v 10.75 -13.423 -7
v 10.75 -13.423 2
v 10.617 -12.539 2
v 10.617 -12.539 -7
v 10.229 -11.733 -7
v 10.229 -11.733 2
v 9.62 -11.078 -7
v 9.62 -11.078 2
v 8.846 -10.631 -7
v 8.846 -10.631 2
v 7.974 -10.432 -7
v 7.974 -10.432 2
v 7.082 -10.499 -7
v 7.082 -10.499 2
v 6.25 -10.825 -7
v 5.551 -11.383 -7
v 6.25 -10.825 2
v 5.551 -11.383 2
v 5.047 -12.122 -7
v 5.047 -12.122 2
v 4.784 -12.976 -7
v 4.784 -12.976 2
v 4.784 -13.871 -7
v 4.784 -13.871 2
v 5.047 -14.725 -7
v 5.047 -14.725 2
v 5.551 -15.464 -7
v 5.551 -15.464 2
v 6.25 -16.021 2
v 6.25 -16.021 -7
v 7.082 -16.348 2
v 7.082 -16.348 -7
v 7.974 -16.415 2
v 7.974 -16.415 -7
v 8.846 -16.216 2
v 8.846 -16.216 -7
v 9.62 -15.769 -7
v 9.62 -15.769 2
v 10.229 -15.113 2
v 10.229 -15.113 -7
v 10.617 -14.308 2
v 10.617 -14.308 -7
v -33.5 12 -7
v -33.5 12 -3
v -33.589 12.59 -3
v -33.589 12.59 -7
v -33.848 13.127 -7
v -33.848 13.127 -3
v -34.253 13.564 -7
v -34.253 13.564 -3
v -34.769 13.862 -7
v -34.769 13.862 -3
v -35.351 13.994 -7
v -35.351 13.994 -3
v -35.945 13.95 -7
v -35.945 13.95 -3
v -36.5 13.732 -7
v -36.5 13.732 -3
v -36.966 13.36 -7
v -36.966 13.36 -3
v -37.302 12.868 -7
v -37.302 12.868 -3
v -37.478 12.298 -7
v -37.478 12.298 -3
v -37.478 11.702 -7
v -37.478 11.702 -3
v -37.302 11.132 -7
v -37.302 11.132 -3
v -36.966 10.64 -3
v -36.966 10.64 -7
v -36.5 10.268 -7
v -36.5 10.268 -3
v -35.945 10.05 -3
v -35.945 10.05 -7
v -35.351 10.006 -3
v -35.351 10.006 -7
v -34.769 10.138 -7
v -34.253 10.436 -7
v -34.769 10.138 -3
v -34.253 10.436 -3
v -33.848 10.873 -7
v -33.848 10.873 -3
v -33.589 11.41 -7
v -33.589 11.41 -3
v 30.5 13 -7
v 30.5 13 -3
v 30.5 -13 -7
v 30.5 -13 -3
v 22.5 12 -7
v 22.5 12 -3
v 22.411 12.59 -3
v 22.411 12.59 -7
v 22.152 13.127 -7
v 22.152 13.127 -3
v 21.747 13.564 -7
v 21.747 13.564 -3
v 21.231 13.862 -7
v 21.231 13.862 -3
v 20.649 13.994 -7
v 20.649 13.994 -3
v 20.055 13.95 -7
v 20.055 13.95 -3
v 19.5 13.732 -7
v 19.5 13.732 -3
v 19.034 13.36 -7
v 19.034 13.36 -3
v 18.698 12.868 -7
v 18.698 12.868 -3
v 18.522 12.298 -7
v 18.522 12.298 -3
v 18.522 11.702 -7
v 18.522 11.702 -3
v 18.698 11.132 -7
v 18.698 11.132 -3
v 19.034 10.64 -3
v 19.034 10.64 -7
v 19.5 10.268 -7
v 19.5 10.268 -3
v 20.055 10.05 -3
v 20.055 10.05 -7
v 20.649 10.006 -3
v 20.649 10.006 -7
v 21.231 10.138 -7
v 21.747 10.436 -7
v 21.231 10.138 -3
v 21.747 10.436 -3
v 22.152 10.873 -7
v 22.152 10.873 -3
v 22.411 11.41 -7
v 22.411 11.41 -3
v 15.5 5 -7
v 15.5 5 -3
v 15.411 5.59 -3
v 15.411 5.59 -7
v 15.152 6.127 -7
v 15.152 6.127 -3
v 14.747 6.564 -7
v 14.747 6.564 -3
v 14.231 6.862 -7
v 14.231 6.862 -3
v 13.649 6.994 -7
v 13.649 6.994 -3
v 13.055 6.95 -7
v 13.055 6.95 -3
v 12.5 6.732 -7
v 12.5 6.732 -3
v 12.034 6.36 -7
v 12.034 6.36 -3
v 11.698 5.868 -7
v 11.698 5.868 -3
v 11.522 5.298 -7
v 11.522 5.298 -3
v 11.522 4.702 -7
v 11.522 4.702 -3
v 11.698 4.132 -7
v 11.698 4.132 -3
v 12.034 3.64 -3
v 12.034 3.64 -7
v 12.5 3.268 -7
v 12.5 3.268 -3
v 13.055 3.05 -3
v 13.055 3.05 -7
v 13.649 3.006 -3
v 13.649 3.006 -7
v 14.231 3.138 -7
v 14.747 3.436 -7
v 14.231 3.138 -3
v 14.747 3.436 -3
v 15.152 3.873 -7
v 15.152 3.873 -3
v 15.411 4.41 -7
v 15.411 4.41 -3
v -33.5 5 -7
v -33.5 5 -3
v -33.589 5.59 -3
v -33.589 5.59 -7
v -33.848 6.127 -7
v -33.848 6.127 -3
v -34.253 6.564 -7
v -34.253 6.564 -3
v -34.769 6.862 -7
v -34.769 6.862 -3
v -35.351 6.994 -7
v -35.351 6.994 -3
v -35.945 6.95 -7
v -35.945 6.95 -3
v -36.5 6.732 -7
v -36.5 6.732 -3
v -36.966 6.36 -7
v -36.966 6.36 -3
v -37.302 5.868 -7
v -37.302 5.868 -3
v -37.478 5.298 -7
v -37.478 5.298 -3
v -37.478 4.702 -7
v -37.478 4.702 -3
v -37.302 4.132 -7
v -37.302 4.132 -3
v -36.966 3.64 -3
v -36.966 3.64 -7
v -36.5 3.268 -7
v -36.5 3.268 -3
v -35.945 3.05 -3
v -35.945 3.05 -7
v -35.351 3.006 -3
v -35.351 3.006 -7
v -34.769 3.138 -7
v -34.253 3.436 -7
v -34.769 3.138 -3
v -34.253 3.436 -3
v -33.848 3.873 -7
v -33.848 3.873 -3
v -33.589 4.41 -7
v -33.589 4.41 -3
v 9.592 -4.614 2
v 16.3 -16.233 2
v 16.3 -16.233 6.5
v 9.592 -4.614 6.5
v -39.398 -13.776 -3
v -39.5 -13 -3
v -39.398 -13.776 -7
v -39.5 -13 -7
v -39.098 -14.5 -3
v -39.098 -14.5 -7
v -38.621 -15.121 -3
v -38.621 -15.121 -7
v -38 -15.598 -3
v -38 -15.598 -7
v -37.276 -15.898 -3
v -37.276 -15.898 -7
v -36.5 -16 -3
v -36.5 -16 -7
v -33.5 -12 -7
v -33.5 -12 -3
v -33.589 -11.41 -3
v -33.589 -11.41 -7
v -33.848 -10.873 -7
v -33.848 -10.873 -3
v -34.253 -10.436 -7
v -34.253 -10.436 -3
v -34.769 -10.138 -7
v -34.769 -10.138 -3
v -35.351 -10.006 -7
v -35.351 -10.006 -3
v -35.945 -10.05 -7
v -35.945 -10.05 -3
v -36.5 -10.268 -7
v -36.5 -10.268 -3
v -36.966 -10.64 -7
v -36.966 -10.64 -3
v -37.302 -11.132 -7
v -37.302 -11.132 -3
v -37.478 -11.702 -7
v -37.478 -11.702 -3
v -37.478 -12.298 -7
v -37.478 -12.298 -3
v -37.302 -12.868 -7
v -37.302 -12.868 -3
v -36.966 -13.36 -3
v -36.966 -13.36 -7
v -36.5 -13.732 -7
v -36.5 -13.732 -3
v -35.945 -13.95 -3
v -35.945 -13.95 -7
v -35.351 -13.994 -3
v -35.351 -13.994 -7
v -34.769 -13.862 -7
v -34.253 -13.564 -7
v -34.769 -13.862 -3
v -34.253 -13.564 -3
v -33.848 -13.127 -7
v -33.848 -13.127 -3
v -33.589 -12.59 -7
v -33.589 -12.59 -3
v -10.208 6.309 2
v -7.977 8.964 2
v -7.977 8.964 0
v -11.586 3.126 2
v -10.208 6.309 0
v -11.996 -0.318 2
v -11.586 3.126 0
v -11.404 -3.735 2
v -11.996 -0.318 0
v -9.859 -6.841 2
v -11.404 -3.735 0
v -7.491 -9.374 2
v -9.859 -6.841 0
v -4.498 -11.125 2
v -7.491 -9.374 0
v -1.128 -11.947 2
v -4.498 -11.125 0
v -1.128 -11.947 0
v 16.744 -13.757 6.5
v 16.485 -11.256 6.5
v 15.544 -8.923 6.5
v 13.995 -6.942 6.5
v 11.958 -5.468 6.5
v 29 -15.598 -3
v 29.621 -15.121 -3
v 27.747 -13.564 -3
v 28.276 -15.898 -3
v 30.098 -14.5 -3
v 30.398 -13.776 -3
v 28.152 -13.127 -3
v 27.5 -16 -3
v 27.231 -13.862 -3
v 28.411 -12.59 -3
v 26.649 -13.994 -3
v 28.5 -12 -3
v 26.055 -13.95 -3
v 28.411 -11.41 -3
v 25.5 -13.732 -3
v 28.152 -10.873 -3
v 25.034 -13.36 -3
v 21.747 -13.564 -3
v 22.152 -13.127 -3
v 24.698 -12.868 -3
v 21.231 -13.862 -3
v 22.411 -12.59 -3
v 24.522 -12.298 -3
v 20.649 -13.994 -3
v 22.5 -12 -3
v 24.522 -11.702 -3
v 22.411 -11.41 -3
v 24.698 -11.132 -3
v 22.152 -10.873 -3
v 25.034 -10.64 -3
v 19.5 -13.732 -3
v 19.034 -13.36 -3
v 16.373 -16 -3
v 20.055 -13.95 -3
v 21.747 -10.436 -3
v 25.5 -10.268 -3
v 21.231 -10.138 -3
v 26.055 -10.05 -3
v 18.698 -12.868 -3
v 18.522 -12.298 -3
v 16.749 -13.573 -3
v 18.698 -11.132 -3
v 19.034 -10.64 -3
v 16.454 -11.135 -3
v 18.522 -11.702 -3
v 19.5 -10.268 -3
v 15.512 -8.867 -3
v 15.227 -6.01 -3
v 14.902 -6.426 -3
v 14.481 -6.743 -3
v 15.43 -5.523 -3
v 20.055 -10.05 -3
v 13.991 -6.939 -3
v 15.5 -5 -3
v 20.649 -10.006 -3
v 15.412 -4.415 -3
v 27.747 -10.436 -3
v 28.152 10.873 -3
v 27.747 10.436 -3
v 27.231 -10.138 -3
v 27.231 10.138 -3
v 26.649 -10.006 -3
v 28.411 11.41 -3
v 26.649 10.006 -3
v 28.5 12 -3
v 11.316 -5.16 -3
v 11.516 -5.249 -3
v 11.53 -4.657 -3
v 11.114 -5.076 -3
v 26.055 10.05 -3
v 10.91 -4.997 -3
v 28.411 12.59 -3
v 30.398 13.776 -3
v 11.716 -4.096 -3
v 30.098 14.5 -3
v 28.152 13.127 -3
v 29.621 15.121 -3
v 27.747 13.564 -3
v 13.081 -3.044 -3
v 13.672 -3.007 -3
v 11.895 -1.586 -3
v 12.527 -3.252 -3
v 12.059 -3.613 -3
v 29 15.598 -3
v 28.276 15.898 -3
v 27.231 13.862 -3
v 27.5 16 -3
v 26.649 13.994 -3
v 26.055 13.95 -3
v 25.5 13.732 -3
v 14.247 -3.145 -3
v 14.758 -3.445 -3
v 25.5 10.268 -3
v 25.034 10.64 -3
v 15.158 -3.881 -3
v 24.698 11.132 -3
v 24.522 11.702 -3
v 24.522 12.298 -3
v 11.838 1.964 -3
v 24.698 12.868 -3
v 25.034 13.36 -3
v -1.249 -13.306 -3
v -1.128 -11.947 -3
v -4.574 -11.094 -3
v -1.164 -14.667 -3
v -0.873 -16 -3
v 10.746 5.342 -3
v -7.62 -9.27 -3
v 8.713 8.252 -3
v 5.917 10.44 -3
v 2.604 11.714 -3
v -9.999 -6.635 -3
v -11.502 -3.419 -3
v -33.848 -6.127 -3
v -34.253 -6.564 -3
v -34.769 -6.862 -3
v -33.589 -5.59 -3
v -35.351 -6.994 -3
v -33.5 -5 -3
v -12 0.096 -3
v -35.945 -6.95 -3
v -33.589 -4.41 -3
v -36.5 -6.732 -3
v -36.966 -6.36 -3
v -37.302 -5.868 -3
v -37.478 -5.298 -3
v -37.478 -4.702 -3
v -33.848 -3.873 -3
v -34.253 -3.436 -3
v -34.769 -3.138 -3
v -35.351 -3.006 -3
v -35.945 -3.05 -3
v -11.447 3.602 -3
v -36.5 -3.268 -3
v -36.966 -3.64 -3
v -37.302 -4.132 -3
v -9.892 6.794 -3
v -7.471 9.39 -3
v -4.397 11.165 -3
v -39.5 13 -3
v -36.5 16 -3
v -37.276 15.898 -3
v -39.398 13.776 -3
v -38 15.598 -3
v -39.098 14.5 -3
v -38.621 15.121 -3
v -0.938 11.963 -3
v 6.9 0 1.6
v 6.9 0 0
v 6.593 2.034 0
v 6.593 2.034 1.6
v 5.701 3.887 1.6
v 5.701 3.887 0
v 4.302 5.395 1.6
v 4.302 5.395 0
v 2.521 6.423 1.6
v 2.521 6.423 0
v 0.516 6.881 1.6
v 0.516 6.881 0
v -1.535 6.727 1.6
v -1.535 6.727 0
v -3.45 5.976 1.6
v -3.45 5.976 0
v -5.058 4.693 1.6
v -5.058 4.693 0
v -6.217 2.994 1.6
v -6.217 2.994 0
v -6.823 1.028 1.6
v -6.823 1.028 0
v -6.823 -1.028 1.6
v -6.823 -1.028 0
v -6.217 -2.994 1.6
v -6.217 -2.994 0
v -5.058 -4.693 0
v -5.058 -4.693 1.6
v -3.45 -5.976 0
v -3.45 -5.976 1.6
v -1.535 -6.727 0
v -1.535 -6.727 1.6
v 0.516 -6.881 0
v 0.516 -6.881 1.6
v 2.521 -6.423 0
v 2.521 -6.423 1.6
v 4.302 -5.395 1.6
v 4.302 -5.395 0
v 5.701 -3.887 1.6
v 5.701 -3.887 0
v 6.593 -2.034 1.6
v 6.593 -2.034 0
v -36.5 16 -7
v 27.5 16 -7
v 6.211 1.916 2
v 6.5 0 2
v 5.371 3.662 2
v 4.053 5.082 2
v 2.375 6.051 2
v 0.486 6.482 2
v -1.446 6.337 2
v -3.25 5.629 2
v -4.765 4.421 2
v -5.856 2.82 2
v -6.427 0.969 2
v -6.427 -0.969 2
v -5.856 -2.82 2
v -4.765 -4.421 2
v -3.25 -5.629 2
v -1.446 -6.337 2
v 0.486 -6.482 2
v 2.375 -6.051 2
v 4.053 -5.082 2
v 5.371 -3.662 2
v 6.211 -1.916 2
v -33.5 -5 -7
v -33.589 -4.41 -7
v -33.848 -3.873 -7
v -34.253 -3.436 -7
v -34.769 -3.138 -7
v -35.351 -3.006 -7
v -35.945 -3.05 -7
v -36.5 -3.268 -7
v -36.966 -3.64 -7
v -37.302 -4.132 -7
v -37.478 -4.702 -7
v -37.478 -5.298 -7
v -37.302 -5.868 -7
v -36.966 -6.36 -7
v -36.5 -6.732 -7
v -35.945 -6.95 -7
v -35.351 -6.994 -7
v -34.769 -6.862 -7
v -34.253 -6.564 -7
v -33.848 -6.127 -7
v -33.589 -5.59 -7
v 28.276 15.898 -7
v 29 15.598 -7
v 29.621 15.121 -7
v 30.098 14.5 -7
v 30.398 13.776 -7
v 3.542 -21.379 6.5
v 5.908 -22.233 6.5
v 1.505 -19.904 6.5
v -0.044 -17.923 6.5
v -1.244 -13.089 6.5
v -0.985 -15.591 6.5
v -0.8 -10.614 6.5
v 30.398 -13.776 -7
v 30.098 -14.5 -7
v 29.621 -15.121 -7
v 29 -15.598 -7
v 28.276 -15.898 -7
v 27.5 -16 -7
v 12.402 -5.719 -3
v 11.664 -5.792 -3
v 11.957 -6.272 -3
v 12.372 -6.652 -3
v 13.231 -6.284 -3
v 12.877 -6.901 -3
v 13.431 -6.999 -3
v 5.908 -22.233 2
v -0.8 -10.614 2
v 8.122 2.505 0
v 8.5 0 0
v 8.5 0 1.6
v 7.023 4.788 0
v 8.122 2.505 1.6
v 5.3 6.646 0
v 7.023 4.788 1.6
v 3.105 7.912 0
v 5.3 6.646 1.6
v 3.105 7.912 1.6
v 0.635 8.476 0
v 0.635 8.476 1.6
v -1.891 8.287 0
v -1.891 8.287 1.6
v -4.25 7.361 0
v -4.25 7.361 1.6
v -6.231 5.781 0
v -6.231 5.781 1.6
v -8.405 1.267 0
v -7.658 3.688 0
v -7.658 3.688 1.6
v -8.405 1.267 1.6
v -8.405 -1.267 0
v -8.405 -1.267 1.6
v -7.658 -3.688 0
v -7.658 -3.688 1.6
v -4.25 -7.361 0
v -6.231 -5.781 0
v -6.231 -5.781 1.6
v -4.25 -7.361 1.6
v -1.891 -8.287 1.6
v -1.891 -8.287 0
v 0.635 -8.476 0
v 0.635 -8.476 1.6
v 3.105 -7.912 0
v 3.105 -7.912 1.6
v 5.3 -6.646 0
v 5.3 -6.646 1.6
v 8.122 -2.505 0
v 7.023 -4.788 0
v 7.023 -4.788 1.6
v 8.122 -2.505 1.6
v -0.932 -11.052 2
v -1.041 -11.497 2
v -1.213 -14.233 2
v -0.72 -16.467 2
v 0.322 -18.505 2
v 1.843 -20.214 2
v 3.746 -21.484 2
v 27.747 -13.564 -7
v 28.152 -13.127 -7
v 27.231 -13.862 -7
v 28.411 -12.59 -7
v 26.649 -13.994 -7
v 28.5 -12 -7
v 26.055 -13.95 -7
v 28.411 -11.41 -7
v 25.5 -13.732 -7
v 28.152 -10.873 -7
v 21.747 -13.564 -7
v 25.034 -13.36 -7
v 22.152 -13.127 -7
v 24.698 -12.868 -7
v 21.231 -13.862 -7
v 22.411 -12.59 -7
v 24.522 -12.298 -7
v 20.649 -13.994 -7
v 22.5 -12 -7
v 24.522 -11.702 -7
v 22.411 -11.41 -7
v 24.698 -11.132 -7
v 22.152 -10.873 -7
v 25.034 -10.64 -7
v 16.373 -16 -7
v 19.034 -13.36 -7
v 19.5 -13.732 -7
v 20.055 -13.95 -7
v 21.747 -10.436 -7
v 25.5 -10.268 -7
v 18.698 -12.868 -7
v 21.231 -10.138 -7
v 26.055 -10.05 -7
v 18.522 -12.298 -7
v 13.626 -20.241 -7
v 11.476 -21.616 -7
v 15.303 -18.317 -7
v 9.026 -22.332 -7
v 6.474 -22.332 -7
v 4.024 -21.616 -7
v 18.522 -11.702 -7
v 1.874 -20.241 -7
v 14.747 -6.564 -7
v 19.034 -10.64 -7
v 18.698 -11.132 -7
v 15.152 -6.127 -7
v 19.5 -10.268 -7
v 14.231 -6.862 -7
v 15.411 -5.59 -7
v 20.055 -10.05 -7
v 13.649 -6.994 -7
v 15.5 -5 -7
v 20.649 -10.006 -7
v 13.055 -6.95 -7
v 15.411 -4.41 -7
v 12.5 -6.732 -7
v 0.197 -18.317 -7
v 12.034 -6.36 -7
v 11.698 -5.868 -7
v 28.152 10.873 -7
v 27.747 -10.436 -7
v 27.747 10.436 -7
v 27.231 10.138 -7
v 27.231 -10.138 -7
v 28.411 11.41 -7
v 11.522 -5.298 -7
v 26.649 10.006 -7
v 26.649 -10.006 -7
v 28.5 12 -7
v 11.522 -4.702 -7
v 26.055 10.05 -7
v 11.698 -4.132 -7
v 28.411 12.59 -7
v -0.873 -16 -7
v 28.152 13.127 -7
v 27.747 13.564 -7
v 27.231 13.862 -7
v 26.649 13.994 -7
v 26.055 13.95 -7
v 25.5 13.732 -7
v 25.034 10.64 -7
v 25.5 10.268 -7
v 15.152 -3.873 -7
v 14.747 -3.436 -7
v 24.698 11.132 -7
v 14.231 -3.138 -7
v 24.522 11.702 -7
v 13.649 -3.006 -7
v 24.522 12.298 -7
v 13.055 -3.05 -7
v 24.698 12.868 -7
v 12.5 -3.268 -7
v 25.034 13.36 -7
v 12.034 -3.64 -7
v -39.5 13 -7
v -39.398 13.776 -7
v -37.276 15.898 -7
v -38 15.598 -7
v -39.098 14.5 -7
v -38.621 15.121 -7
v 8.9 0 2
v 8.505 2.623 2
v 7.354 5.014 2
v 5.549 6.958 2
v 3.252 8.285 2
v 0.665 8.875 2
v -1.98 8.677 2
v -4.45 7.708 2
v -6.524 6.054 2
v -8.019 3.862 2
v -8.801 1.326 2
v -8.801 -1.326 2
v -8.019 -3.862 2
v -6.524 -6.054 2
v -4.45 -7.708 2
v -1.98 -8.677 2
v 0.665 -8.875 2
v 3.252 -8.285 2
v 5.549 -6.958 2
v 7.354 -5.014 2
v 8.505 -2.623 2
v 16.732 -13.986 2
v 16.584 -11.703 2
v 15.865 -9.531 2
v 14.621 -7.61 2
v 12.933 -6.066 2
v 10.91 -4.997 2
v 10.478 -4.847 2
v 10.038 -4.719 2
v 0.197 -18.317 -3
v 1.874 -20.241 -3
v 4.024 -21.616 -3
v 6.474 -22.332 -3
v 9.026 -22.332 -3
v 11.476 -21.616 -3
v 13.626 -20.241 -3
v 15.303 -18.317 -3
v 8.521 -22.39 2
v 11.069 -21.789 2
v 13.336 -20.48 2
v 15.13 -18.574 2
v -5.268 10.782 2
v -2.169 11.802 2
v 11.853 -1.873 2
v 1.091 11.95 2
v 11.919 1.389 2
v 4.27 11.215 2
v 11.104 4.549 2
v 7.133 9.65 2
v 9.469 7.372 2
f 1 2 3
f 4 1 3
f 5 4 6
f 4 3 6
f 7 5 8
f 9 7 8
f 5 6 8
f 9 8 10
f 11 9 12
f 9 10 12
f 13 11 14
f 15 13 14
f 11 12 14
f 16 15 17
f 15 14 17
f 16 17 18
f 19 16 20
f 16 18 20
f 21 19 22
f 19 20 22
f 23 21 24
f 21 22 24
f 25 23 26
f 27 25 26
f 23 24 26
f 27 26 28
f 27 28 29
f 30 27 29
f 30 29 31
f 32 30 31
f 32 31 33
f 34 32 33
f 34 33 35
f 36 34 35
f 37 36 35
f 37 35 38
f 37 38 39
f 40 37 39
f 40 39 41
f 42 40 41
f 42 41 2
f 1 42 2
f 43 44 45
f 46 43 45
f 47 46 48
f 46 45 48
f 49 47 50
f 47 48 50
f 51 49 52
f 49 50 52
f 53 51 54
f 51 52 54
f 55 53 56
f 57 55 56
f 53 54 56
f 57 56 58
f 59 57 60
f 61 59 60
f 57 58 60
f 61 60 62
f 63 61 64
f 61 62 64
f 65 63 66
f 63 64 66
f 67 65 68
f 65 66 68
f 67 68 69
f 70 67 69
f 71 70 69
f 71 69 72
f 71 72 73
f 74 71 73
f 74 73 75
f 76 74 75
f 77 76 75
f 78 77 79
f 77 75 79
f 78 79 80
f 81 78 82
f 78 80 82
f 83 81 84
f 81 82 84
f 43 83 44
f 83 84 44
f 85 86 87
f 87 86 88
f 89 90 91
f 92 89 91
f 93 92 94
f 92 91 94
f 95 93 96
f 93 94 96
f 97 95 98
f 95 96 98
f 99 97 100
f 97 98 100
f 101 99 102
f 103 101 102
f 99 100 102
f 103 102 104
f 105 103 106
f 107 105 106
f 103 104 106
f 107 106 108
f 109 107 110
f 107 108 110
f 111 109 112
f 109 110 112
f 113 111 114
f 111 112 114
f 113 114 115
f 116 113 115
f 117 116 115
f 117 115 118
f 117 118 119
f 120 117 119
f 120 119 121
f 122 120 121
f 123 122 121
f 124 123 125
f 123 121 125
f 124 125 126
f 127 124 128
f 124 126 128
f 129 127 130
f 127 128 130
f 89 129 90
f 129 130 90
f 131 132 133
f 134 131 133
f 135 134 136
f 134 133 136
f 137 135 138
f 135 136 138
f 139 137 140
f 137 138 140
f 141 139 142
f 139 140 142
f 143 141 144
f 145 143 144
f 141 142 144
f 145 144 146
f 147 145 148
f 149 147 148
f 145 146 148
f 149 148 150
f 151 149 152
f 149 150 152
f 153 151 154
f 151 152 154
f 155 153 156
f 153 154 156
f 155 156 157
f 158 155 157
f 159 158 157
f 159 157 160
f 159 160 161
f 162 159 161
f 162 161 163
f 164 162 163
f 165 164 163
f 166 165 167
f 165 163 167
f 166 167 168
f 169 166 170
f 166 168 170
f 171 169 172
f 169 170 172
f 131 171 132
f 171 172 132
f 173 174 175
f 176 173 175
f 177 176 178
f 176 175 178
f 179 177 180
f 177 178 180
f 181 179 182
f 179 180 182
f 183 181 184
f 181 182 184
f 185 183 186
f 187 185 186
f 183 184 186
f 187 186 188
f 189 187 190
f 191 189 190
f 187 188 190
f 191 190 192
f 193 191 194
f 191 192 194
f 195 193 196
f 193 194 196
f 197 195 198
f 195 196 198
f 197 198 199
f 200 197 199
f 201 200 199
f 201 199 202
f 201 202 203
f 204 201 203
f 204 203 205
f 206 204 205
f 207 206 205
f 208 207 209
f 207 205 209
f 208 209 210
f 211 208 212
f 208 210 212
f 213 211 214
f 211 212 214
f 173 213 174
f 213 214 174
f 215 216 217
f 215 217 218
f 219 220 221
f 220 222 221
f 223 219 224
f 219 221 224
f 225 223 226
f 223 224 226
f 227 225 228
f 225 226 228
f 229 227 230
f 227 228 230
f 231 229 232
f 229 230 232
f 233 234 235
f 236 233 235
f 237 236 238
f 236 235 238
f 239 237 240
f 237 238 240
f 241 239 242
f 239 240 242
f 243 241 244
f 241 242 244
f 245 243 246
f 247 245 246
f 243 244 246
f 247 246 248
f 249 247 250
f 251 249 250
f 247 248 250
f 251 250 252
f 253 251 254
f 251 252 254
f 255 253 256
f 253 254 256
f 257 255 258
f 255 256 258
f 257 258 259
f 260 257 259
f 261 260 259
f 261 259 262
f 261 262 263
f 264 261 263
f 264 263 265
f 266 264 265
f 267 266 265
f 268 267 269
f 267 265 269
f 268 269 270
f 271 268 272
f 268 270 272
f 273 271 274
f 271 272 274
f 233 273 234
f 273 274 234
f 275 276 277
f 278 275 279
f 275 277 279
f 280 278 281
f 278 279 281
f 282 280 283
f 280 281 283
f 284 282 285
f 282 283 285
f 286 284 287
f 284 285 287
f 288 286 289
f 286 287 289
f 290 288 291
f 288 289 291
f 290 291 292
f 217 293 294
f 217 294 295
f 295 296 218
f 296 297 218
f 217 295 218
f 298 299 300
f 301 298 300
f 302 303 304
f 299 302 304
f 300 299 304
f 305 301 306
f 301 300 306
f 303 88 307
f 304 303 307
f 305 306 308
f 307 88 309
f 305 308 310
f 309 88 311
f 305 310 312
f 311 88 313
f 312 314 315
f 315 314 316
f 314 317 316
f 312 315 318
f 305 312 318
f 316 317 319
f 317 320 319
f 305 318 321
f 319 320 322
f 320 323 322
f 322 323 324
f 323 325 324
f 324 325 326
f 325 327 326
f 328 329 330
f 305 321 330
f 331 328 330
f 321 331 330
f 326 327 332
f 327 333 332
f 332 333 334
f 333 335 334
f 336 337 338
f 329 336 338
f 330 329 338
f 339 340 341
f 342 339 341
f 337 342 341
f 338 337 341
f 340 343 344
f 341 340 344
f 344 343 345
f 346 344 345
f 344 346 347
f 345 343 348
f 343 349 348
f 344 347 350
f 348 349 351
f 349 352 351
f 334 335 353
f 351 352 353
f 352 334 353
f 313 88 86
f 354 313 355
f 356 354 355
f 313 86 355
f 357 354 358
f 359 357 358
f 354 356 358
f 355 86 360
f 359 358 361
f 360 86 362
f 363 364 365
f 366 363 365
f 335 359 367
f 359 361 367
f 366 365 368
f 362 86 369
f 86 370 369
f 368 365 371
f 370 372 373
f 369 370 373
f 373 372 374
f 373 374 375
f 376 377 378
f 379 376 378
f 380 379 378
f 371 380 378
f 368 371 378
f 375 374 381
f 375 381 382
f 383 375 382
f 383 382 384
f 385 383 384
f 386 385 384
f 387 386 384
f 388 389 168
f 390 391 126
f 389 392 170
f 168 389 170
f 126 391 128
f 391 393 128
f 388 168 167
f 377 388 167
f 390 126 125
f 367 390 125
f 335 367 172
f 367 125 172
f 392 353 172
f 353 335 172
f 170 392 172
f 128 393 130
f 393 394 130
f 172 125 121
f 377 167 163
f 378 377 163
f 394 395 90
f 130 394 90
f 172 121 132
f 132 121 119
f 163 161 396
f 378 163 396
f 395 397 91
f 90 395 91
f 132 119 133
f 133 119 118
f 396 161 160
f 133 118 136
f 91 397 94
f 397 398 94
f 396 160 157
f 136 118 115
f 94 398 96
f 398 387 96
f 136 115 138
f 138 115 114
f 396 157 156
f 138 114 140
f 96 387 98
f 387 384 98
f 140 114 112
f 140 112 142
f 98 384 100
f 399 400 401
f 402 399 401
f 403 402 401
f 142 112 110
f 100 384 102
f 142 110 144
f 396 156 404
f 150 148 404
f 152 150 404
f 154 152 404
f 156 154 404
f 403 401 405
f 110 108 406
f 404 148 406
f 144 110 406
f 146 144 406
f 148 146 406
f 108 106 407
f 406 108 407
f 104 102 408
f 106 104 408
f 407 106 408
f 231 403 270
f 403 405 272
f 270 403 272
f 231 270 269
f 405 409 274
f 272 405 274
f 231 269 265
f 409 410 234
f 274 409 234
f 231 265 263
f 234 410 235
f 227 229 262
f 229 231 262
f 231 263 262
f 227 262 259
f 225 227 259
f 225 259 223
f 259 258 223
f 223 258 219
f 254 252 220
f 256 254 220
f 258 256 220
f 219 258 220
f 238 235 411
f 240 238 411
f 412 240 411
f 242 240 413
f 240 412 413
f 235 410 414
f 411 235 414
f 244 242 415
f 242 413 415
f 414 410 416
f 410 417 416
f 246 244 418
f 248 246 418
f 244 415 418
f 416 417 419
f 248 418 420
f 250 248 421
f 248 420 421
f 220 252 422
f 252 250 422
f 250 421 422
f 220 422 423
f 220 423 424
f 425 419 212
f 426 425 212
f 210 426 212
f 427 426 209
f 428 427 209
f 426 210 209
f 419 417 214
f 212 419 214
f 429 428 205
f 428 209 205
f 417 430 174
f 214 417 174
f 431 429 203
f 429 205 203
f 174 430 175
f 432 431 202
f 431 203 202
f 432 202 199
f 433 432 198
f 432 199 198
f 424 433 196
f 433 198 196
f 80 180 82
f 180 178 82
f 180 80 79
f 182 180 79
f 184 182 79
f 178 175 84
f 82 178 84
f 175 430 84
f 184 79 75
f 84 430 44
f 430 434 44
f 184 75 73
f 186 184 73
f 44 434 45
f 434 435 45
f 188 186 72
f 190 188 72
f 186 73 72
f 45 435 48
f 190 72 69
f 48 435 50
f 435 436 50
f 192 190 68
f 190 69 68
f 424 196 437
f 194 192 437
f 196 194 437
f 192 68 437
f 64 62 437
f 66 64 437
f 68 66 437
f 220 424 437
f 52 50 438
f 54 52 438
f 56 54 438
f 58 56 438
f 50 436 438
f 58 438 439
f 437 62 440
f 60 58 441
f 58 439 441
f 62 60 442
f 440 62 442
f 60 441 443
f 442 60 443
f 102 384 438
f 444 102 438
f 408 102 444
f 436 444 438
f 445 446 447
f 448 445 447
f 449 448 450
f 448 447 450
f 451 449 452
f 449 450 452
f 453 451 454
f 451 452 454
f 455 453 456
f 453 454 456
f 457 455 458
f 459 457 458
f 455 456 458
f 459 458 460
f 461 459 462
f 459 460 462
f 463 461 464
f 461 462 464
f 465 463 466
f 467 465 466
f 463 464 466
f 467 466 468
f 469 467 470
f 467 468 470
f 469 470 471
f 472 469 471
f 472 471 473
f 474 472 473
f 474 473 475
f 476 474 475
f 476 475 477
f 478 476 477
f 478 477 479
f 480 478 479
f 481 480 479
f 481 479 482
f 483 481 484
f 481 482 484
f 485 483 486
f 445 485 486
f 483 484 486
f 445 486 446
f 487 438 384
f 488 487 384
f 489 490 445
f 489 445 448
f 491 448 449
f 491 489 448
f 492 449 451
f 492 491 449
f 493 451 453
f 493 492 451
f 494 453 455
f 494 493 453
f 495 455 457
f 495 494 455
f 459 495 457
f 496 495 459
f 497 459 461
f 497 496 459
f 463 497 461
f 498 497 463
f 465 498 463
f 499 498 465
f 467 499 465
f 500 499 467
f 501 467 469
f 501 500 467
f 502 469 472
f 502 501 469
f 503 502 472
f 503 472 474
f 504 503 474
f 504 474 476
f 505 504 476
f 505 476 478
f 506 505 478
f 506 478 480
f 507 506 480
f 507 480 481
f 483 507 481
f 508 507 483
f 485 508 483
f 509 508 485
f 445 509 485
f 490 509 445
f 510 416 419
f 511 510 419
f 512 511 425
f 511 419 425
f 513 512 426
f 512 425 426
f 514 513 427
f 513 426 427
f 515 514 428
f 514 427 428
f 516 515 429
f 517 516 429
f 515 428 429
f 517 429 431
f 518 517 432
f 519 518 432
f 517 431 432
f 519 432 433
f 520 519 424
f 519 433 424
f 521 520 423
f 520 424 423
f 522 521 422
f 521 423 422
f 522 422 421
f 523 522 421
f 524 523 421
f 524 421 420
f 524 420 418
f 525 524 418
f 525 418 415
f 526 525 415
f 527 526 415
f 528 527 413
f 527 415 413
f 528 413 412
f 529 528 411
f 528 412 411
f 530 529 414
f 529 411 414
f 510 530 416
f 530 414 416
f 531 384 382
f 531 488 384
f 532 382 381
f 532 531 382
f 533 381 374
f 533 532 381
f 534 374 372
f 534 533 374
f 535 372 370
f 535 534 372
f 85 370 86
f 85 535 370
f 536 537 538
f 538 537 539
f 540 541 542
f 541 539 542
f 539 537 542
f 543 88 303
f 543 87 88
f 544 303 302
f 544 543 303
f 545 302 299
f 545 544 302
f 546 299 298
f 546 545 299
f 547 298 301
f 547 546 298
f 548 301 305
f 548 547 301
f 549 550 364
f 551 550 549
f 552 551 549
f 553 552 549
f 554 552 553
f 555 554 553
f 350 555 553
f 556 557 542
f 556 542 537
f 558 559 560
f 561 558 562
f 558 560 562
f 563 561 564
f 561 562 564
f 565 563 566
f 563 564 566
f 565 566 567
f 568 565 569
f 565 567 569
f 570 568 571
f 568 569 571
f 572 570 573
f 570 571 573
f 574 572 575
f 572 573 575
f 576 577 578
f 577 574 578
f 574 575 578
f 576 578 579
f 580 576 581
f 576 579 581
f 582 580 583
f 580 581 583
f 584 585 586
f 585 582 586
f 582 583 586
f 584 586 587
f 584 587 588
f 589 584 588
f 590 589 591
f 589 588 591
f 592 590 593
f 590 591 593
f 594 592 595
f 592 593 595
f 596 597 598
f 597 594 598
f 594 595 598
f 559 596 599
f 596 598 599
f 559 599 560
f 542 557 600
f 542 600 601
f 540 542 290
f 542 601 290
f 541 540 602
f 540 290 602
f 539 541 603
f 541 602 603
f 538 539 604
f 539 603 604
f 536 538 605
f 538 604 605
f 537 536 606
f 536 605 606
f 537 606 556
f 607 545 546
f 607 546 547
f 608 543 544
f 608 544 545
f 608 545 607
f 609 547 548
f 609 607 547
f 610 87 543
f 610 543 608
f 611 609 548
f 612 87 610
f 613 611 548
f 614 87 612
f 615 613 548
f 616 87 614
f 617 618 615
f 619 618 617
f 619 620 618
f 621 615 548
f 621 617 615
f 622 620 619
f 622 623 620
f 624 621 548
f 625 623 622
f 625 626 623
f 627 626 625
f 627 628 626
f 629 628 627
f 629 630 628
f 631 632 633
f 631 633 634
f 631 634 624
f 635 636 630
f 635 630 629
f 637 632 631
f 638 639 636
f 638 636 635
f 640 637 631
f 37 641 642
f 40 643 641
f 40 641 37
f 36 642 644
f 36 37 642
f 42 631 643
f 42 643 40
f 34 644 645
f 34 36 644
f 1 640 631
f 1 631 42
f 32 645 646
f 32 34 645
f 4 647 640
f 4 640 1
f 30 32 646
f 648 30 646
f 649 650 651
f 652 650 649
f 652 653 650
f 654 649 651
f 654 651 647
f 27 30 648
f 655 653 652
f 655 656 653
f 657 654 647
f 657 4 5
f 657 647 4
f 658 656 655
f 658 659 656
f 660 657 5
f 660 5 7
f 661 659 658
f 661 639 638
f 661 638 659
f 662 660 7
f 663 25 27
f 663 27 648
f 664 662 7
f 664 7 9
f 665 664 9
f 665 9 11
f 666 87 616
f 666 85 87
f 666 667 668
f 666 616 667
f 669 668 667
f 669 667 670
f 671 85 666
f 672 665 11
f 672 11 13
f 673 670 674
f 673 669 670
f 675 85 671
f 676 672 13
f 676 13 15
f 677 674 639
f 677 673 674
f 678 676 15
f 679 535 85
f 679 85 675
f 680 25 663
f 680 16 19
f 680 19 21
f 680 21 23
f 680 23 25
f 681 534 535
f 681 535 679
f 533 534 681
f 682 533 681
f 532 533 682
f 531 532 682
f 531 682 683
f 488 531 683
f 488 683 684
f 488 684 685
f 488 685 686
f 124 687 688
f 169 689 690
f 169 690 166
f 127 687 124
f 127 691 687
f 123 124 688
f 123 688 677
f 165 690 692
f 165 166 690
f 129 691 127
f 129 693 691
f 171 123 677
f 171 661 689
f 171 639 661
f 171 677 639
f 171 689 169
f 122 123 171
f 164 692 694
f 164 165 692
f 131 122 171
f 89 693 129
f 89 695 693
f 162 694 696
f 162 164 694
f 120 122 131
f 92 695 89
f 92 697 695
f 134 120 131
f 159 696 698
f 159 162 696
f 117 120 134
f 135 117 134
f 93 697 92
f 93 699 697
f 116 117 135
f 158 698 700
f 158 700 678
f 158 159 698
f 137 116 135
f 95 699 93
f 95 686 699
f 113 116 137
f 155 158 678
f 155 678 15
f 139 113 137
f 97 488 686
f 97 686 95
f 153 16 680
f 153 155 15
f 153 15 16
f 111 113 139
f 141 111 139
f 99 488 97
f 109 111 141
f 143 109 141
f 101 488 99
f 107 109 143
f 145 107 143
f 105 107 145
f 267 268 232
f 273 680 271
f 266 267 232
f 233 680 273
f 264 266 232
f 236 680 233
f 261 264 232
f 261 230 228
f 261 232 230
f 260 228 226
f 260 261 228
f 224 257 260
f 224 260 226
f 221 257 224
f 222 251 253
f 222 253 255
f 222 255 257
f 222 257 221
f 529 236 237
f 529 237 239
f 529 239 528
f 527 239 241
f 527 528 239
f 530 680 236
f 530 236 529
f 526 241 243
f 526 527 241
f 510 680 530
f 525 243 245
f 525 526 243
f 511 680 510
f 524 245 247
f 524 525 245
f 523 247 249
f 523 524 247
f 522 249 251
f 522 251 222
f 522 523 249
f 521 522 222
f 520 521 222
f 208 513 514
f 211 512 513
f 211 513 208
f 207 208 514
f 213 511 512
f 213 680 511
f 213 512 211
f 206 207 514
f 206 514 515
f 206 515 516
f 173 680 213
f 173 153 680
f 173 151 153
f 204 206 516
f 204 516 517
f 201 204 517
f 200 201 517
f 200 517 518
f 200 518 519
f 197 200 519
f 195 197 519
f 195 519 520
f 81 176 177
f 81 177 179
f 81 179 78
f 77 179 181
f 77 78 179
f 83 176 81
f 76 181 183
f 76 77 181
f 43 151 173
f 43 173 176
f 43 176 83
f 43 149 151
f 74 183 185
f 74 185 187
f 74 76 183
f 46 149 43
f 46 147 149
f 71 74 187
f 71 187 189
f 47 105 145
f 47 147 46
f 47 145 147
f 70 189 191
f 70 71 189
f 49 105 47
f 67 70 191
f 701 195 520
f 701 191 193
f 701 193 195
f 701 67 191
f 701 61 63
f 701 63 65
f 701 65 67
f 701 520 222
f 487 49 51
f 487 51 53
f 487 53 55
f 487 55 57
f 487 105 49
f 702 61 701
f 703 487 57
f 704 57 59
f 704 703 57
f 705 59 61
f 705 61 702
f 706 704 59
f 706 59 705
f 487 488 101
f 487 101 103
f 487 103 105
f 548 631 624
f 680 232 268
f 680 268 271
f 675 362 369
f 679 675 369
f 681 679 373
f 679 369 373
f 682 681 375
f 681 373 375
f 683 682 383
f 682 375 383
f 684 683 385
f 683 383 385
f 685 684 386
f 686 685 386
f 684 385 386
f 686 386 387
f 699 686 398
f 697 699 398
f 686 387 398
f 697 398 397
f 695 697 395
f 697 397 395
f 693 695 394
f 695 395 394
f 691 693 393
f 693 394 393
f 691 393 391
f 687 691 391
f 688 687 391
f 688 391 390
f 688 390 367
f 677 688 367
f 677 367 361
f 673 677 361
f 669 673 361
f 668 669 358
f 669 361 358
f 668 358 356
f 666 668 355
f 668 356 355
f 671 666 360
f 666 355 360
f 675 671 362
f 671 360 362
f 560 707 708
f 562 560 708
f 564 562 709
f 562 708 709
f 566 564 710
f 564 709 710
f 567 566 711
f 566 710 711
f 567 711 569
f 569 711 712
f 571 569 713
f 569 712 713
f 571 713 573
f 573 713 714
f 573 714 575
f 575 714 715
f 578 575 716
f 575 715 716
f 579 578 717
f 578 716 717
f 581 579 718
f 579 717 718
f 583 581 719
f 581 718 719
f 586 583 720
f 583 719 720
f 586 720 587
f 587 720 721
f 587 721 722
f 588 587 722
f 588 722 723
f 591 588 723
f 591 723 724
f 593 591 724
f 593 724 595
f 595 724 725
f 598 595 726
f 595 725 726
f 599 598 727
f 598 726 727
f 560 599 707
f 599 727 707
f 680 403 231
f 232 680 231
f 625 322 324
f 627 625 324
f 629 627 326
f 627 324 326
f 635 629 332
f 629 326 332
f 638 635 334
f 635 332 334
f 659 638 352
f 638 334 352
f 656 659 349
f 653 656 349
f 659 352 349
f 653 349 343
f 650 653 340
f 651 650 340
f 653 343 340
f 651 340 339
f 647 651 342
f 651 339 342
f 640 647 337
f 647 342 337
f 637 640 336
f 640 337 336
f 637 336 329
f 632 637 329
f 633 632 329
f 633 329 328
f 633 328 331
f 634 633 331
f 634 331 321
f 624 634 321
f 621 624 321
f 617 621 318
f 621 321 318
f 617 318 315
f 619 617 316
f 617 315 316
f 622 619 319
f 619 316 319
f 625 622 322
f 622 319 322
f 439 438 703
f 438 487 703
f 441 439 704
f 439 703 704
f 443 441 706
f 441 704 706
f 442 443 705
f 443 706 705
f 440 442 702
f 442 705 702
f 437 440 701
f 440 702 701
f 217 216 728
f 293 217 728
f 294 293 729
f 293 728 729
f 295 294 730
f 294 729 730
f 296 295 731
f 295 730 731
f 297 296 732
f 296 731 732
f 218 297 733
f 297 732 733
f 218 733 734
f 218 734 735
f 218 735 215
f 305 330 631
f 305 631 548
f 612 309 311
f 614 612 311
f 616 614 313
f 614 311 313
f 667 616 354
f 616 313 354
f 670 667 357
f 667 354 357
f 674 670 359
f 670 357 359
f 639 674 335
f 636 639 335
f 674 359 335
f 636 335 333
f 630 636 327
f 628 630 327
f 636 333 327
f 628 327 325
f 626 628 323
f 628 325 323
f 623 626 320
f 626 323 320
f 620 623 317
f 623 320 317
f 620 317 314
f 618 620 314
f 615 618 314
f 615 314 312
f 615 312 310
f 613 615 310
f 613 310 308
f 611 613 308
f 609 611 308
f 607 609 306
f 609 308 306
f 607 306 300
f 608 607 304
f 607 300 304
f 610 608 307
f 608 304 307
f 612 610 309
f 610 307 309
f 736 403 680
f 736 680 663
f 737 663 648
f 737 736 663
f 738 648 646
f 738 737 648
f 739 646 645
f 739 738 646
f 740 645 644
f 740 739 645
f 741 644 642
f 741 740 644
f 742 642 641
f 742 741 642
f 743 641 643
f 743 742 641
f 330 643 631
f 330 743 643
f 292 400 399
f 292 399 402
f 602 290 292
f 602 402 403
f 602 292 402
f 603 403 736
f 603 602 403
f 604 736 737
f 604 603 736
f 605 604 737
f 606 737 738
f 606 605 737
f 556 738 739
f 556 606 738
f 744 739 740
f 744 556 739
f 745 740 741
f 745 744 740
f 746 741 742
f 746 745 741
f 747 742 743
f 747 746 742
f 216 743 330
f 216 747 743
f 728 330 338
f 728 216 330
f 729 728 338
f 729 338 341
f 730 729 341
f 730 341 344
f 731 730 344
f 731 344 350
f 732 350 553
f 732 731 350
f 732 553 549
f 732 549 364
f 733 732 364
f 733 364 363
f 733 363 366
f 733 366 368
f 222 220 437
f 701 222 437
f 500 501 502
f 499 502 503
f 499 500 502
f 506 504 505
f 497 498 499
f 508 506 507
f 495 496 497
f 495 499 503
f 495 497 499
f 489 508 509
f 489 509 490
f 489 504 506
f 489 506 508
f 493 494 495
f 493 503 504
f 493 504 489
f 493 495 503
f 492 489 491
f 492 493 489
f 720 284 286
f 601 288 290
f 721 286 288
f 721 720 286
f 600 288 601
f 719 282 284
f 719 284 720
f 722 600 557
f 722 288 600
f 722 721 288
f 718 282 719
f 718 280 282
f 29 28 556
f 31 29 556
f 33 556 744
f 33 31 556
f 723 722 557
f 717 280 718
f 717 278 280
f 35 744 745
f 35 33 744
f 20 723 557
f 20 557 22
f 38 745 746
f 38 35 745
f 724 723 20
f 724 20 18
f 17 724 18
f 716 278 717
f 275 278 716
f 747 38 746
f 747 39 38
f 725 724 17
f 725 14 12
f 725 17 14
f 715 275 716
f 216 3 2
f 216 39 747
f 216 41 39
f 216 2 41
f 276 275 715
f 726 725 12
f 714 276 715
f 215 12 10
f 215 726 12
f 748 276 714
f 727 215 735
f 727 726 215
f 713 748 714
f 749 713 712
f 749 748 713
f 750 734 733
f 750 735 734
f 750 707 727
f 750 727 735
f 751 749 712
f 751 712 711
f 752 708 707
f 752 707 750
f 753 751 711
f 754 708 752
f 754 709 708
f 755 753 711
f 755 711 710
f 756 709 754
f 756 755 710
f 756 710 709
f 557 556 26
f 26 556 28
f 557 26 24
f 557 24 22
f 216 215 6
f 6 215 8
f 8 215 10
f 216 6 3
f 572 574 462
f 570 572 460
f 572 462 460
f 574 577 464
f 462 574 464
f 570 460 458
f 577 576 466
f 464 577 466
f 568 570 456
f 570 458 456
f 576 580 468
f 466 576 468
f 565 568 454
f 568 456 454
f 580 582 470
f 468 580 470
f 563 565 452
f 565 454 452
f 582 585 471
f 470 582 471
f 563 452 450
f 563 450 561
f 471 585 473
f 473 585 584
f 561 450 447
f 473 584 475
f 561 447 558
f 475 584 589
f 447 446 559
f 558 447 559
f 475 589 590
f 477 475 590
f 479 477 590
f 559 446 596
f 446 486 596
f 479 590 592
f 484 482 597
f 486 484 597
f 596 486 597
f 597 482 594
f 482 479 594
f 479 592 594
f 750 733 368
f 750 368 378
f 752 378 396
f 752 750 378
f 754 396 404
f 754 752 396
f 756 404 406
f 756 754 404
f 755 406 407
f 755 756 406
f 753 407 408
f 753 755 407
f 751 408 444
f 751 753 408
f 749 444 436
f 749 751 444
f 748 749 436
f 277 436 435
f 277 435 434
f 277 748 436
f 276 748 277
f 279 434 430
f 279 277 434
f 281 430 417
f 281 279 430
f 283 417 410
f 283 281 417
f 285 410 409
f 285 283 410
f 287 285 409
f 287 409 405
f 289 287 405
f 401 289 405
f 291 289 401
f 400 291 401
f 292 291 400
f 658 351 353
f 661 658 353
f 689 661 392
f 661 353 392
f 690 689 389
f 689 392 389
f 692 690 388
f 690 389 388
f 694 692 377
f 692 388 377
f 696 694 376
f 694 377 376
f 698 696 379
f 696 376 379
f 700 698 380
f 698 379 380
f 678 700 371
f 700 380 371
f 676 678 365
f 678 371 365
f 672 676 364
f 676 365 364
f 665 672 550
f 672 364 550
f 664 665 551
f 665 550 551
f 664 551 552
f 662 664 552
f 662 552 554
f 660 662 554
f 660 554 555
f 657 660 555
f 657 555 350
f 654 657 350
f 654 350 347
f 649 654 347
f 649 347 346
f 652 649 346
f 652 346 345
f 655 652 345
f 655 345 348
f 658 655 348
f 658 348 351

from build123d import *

# Parameters (mm, degrees)
SKETCH_R        = 12
SKETCH_R_2      = 8.5
PAD_DEPTH       = 2
SKETCH001_R     = 3
SKETCH001_R_2   = 8.5
PAD001_DEPTH    = 5
SKETCH002_R     = 8.5
PAD002_DEPTH    = 3
SKETCH003_R     = 6.9
PAD003_DEPTH    = 2
PAD004_DEPTH    = 4.5
SKETCH005_R     = 2
PAD005_DEPTH    = 4
FILLET_R        = 3
CHAMFER_SIZE    = 0.4
CHAMFER001_SIZE = 0.4
SKETCH006_R     = 3
POCKET_DEPTH    = 4.001


with BuildPart() as part:
    # Sketch → Pad (new body)
    with BuildSketch(Plane.XY):
        Circle(SKETCH_R)
        Circle(SKETCH_R_2, mode=Mode.SUBTRACT)
    extrude(amount=PAD_DEPTH)

    # Sketch001 (on Face4 of Pad) → Pad001 (join)
    with BuildSketch(Plane.XY.offset(2)):
        with BuildLine():
            ThreePointArc((-1.128054, -11.946861), (12.25, -21.217622), (10.910313, -4.996507))
            ThreePointArc((10.910313, -4.996507), (-6, 10.392305), (-1.128054, -11.946861))
        make_face()
        with Locations((7.75, -13.423394)):
            Circle(SKETCH001_R, mode=Mode.SUBTRACT)
        Circle(SKETCH001_R_2, mode=Mode.SUBTRACT)
    extrude(amount=-PAD001_DEPTH)

    # Sketch002 (on Face6 of Pad001) → Pad002 (join)
    with BuildSketch(Plane(origin=(0, 0, -3), x_dir=(1, 0, 0), z_dir=(0, 0, -1))):
        Circle(SKETCH002_R)
    extrude(amount=-PAD002_DEPTH)

    # Sketch003 (on Face11 of Pad002) → Pad003 (join)
    with BuildSketch(Plane.XY):
        Circle(SKETCH003_R)
    extrude(amount=PAD003_DEPTH)

    # Sketch004 (on Face7 of Pad003) → Pad004 (join)
    with BuildSketch(Plane.XY.offset(2)):
        with BuildLine():
            Line((-0.800254, -10.613919), (5.90795, -22.232869))
            ThreePointArc((-0.800254, -10.613919), (-0.044229, -17.923394), (5.90795, -22.232869))
        make_face()
        with BuildLine():
            Line((16.300254, -16.232869), (9.59205, -4.613919))
            ThreePointArc((16.300254, -16.232869), (15.544229, -8.923394), (9.59205, -4.613919))
        make_face()
    extrude(amount=PAD004_DEPTH)

    # Sketch005 (on Face19 of Pad004) → Pad005 (join)
    with BuildSketch(Plane.XY.offset(-3)):
        with BuildLine():
            Line((-39.5, 16), (17.5, 16))
            Line((17.5, 16), (24.5, 16))
            Line((24.5, 16), (30.5, 16))
            Line((30.5, 16), (30.5, -16))
            Line((24.5, -16), (30.5, -16))
            Line((17.5, -16), (24.5, -16))
            Line((17.5, -16), (16.373288, -16))
            ThreePointArc((-0.873288, -16), (7.75, -22.423394), (16.373288, -16))
            Line((-0.873288, -16), (-39.5, -16))
            Line((-39.5, -16), (-39.5, 16))
        make_face()
        with Locations((-35.5, 5)):
            Circle(SKETCH005_R, mode=Mode.SUBTRACT)
        with Locations((-35.5, -5)):
            Circle(SKETCH005_R, mode=Mode.SUBTRACT)
        with Locations((13.5, 5)):
            Circle(SKETCH005_R, mode=Mode.SUBTRACT)
        with Locations((13.5, -5)):
            Circle(SKETCH005_R, mode=Mode.SUBTRACT)
        with Locations((-35.5, 12)):
            Circle(SKETCH005_R, mode=Mode.SUBTRACT)
        with Locations((-35.5, -12)):
            Circle(SKETCH005_R, mode=Mode.SUBTRACT)
        with Locations((20.5, 12)):
            Circle(SKETCH005_R, mode=Mode.SUBTRACT)
        with Locations((20.5, -12)):
            Circle(SKETCH005_R, mode=Mode.SUBTRACT)
        with Locations((26.5, -12)):
            Circle(SKETCH005_R, mode=Mode.SUBTRACT)
        with Locations((26.5, 12)):
            Circle(SKETCH005_R, mode=Mode.SUBTRACT)
    extrude(amount=-PAD005_DEPTH)

    # Fillet
    fillet_edges = [part.edges().sort_by_distance(p)[0] for p in [
        (-39.5, -16, -5),
        (30.5, -16, -5),
        (30.5, 16, -5),
        (-39.5, 16, -5),
    ]]
    fillet(fillet_edges, radius=FILLET_R)

    # Chamfer
    chamfer_edges = [part.edges().sort_by_distance(p)[0] for p in [
        (-6.9, 0, 2),
    ]]
    chamfer(chamfer_edges, length=CHAMFER_SIZE)

    # Chamfer001
    chamfer001_edges = [part.edges().sort_by_distance(p)[0] for p in [
        (-8.5, 0, 2),
    ]]
    chamfer(chamfer001_edges, length=CHAMFER001_SIZE)

    # Sketch006 (on Face23 of Chamfer001) → Pocket (cut, through all)
    with BuildSketch(Plane.XY.offset(-3)):
        with Locations((7.75, -13.423394)):
            Circle(SKETCH006_R)
    extrude(amount=-POCKET_DEPTH, mode=Mode.SUBTRACT)


solid = part.part
